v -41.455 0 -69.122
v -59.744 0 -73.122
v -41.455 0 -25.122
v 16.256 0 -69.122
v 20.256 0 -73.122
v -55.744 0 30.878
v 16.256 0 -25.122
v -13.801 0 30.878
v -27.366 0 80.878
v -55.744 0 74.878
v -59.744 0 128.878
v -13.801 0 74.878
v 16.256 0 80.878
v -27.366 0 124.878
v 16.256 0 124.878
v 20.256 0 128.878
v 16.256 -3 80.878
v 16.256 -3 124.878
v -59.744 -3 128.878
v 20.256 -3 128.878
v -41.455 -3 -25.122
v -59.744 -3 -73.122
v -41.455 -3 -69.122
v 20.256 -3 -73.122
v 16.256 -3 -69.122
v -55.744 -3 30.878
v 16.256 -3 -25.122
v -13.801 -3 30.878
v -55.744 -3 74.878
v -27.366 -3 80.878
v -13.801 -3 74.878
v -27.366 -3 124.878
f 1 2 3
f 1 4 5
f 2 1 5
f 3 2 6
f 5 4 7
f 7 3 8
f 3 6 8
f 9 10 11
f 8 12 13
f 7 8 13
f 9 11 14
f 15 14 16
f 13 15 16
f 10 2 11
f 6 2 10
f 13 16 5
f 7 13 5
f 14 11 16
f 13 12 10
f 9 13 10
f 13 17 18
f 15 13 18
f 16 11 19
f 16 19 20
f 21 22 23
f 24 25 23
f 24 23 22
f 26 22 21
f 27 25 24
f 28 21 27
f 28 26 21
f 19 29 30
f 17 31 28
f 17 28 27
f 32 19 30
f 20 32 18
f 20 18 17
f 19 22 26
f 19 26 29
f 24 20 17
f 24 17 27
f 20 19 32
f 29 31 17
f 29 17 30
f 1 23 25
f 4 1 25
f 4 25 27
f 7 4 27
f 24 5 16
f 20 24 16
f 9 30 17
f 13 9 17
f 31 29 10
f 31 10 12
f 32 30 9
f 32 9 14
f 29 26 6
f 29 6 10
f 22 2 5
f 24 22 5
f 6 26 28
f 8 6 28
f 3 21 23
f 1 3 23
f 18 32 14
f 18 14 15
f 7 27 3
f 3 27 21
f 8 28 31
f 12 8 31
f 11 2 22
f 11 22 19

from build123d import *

# Parameters (mm, degrees)
F0_W     = 80
F0_H     = 202
F1_DEPTH = 3
F2_W     = 41.942806
F2_H     = 44
F2_W_2   = 43.622092
F3_DEPTH = 25


with BuildPart() as f1:
    # F0 (on Front) → F1 (new body)
    with BuildSketch(Plane.XZ):
        with Locations((-19.744222, 27.878283)):
            Rectangle(F0_W, F0_H)
    extrude(amount=F1_DEPTH)

    # F2 (on face) → F3 (cut)
    with BuildSketch(Plane.XZ.offset(3)):
        with Locations((-34.772819, 52.878283)):
            Rectangle(F2_W, F2_H)
        with Locations((-5.555268, 102.878283)):
            Rectangle(F2_W_2, F2_H)
        Polygon((16.255778, -25.121717), (-41.454826, -25.121717), (-41.454826, -42.175964), (-41.454826, -69.121717), (16.255778, -69.121717), align=None)
    extrude(amount=-F3_DEPTH, mode=Mode.SUBTRACT)


solid = f1.part
